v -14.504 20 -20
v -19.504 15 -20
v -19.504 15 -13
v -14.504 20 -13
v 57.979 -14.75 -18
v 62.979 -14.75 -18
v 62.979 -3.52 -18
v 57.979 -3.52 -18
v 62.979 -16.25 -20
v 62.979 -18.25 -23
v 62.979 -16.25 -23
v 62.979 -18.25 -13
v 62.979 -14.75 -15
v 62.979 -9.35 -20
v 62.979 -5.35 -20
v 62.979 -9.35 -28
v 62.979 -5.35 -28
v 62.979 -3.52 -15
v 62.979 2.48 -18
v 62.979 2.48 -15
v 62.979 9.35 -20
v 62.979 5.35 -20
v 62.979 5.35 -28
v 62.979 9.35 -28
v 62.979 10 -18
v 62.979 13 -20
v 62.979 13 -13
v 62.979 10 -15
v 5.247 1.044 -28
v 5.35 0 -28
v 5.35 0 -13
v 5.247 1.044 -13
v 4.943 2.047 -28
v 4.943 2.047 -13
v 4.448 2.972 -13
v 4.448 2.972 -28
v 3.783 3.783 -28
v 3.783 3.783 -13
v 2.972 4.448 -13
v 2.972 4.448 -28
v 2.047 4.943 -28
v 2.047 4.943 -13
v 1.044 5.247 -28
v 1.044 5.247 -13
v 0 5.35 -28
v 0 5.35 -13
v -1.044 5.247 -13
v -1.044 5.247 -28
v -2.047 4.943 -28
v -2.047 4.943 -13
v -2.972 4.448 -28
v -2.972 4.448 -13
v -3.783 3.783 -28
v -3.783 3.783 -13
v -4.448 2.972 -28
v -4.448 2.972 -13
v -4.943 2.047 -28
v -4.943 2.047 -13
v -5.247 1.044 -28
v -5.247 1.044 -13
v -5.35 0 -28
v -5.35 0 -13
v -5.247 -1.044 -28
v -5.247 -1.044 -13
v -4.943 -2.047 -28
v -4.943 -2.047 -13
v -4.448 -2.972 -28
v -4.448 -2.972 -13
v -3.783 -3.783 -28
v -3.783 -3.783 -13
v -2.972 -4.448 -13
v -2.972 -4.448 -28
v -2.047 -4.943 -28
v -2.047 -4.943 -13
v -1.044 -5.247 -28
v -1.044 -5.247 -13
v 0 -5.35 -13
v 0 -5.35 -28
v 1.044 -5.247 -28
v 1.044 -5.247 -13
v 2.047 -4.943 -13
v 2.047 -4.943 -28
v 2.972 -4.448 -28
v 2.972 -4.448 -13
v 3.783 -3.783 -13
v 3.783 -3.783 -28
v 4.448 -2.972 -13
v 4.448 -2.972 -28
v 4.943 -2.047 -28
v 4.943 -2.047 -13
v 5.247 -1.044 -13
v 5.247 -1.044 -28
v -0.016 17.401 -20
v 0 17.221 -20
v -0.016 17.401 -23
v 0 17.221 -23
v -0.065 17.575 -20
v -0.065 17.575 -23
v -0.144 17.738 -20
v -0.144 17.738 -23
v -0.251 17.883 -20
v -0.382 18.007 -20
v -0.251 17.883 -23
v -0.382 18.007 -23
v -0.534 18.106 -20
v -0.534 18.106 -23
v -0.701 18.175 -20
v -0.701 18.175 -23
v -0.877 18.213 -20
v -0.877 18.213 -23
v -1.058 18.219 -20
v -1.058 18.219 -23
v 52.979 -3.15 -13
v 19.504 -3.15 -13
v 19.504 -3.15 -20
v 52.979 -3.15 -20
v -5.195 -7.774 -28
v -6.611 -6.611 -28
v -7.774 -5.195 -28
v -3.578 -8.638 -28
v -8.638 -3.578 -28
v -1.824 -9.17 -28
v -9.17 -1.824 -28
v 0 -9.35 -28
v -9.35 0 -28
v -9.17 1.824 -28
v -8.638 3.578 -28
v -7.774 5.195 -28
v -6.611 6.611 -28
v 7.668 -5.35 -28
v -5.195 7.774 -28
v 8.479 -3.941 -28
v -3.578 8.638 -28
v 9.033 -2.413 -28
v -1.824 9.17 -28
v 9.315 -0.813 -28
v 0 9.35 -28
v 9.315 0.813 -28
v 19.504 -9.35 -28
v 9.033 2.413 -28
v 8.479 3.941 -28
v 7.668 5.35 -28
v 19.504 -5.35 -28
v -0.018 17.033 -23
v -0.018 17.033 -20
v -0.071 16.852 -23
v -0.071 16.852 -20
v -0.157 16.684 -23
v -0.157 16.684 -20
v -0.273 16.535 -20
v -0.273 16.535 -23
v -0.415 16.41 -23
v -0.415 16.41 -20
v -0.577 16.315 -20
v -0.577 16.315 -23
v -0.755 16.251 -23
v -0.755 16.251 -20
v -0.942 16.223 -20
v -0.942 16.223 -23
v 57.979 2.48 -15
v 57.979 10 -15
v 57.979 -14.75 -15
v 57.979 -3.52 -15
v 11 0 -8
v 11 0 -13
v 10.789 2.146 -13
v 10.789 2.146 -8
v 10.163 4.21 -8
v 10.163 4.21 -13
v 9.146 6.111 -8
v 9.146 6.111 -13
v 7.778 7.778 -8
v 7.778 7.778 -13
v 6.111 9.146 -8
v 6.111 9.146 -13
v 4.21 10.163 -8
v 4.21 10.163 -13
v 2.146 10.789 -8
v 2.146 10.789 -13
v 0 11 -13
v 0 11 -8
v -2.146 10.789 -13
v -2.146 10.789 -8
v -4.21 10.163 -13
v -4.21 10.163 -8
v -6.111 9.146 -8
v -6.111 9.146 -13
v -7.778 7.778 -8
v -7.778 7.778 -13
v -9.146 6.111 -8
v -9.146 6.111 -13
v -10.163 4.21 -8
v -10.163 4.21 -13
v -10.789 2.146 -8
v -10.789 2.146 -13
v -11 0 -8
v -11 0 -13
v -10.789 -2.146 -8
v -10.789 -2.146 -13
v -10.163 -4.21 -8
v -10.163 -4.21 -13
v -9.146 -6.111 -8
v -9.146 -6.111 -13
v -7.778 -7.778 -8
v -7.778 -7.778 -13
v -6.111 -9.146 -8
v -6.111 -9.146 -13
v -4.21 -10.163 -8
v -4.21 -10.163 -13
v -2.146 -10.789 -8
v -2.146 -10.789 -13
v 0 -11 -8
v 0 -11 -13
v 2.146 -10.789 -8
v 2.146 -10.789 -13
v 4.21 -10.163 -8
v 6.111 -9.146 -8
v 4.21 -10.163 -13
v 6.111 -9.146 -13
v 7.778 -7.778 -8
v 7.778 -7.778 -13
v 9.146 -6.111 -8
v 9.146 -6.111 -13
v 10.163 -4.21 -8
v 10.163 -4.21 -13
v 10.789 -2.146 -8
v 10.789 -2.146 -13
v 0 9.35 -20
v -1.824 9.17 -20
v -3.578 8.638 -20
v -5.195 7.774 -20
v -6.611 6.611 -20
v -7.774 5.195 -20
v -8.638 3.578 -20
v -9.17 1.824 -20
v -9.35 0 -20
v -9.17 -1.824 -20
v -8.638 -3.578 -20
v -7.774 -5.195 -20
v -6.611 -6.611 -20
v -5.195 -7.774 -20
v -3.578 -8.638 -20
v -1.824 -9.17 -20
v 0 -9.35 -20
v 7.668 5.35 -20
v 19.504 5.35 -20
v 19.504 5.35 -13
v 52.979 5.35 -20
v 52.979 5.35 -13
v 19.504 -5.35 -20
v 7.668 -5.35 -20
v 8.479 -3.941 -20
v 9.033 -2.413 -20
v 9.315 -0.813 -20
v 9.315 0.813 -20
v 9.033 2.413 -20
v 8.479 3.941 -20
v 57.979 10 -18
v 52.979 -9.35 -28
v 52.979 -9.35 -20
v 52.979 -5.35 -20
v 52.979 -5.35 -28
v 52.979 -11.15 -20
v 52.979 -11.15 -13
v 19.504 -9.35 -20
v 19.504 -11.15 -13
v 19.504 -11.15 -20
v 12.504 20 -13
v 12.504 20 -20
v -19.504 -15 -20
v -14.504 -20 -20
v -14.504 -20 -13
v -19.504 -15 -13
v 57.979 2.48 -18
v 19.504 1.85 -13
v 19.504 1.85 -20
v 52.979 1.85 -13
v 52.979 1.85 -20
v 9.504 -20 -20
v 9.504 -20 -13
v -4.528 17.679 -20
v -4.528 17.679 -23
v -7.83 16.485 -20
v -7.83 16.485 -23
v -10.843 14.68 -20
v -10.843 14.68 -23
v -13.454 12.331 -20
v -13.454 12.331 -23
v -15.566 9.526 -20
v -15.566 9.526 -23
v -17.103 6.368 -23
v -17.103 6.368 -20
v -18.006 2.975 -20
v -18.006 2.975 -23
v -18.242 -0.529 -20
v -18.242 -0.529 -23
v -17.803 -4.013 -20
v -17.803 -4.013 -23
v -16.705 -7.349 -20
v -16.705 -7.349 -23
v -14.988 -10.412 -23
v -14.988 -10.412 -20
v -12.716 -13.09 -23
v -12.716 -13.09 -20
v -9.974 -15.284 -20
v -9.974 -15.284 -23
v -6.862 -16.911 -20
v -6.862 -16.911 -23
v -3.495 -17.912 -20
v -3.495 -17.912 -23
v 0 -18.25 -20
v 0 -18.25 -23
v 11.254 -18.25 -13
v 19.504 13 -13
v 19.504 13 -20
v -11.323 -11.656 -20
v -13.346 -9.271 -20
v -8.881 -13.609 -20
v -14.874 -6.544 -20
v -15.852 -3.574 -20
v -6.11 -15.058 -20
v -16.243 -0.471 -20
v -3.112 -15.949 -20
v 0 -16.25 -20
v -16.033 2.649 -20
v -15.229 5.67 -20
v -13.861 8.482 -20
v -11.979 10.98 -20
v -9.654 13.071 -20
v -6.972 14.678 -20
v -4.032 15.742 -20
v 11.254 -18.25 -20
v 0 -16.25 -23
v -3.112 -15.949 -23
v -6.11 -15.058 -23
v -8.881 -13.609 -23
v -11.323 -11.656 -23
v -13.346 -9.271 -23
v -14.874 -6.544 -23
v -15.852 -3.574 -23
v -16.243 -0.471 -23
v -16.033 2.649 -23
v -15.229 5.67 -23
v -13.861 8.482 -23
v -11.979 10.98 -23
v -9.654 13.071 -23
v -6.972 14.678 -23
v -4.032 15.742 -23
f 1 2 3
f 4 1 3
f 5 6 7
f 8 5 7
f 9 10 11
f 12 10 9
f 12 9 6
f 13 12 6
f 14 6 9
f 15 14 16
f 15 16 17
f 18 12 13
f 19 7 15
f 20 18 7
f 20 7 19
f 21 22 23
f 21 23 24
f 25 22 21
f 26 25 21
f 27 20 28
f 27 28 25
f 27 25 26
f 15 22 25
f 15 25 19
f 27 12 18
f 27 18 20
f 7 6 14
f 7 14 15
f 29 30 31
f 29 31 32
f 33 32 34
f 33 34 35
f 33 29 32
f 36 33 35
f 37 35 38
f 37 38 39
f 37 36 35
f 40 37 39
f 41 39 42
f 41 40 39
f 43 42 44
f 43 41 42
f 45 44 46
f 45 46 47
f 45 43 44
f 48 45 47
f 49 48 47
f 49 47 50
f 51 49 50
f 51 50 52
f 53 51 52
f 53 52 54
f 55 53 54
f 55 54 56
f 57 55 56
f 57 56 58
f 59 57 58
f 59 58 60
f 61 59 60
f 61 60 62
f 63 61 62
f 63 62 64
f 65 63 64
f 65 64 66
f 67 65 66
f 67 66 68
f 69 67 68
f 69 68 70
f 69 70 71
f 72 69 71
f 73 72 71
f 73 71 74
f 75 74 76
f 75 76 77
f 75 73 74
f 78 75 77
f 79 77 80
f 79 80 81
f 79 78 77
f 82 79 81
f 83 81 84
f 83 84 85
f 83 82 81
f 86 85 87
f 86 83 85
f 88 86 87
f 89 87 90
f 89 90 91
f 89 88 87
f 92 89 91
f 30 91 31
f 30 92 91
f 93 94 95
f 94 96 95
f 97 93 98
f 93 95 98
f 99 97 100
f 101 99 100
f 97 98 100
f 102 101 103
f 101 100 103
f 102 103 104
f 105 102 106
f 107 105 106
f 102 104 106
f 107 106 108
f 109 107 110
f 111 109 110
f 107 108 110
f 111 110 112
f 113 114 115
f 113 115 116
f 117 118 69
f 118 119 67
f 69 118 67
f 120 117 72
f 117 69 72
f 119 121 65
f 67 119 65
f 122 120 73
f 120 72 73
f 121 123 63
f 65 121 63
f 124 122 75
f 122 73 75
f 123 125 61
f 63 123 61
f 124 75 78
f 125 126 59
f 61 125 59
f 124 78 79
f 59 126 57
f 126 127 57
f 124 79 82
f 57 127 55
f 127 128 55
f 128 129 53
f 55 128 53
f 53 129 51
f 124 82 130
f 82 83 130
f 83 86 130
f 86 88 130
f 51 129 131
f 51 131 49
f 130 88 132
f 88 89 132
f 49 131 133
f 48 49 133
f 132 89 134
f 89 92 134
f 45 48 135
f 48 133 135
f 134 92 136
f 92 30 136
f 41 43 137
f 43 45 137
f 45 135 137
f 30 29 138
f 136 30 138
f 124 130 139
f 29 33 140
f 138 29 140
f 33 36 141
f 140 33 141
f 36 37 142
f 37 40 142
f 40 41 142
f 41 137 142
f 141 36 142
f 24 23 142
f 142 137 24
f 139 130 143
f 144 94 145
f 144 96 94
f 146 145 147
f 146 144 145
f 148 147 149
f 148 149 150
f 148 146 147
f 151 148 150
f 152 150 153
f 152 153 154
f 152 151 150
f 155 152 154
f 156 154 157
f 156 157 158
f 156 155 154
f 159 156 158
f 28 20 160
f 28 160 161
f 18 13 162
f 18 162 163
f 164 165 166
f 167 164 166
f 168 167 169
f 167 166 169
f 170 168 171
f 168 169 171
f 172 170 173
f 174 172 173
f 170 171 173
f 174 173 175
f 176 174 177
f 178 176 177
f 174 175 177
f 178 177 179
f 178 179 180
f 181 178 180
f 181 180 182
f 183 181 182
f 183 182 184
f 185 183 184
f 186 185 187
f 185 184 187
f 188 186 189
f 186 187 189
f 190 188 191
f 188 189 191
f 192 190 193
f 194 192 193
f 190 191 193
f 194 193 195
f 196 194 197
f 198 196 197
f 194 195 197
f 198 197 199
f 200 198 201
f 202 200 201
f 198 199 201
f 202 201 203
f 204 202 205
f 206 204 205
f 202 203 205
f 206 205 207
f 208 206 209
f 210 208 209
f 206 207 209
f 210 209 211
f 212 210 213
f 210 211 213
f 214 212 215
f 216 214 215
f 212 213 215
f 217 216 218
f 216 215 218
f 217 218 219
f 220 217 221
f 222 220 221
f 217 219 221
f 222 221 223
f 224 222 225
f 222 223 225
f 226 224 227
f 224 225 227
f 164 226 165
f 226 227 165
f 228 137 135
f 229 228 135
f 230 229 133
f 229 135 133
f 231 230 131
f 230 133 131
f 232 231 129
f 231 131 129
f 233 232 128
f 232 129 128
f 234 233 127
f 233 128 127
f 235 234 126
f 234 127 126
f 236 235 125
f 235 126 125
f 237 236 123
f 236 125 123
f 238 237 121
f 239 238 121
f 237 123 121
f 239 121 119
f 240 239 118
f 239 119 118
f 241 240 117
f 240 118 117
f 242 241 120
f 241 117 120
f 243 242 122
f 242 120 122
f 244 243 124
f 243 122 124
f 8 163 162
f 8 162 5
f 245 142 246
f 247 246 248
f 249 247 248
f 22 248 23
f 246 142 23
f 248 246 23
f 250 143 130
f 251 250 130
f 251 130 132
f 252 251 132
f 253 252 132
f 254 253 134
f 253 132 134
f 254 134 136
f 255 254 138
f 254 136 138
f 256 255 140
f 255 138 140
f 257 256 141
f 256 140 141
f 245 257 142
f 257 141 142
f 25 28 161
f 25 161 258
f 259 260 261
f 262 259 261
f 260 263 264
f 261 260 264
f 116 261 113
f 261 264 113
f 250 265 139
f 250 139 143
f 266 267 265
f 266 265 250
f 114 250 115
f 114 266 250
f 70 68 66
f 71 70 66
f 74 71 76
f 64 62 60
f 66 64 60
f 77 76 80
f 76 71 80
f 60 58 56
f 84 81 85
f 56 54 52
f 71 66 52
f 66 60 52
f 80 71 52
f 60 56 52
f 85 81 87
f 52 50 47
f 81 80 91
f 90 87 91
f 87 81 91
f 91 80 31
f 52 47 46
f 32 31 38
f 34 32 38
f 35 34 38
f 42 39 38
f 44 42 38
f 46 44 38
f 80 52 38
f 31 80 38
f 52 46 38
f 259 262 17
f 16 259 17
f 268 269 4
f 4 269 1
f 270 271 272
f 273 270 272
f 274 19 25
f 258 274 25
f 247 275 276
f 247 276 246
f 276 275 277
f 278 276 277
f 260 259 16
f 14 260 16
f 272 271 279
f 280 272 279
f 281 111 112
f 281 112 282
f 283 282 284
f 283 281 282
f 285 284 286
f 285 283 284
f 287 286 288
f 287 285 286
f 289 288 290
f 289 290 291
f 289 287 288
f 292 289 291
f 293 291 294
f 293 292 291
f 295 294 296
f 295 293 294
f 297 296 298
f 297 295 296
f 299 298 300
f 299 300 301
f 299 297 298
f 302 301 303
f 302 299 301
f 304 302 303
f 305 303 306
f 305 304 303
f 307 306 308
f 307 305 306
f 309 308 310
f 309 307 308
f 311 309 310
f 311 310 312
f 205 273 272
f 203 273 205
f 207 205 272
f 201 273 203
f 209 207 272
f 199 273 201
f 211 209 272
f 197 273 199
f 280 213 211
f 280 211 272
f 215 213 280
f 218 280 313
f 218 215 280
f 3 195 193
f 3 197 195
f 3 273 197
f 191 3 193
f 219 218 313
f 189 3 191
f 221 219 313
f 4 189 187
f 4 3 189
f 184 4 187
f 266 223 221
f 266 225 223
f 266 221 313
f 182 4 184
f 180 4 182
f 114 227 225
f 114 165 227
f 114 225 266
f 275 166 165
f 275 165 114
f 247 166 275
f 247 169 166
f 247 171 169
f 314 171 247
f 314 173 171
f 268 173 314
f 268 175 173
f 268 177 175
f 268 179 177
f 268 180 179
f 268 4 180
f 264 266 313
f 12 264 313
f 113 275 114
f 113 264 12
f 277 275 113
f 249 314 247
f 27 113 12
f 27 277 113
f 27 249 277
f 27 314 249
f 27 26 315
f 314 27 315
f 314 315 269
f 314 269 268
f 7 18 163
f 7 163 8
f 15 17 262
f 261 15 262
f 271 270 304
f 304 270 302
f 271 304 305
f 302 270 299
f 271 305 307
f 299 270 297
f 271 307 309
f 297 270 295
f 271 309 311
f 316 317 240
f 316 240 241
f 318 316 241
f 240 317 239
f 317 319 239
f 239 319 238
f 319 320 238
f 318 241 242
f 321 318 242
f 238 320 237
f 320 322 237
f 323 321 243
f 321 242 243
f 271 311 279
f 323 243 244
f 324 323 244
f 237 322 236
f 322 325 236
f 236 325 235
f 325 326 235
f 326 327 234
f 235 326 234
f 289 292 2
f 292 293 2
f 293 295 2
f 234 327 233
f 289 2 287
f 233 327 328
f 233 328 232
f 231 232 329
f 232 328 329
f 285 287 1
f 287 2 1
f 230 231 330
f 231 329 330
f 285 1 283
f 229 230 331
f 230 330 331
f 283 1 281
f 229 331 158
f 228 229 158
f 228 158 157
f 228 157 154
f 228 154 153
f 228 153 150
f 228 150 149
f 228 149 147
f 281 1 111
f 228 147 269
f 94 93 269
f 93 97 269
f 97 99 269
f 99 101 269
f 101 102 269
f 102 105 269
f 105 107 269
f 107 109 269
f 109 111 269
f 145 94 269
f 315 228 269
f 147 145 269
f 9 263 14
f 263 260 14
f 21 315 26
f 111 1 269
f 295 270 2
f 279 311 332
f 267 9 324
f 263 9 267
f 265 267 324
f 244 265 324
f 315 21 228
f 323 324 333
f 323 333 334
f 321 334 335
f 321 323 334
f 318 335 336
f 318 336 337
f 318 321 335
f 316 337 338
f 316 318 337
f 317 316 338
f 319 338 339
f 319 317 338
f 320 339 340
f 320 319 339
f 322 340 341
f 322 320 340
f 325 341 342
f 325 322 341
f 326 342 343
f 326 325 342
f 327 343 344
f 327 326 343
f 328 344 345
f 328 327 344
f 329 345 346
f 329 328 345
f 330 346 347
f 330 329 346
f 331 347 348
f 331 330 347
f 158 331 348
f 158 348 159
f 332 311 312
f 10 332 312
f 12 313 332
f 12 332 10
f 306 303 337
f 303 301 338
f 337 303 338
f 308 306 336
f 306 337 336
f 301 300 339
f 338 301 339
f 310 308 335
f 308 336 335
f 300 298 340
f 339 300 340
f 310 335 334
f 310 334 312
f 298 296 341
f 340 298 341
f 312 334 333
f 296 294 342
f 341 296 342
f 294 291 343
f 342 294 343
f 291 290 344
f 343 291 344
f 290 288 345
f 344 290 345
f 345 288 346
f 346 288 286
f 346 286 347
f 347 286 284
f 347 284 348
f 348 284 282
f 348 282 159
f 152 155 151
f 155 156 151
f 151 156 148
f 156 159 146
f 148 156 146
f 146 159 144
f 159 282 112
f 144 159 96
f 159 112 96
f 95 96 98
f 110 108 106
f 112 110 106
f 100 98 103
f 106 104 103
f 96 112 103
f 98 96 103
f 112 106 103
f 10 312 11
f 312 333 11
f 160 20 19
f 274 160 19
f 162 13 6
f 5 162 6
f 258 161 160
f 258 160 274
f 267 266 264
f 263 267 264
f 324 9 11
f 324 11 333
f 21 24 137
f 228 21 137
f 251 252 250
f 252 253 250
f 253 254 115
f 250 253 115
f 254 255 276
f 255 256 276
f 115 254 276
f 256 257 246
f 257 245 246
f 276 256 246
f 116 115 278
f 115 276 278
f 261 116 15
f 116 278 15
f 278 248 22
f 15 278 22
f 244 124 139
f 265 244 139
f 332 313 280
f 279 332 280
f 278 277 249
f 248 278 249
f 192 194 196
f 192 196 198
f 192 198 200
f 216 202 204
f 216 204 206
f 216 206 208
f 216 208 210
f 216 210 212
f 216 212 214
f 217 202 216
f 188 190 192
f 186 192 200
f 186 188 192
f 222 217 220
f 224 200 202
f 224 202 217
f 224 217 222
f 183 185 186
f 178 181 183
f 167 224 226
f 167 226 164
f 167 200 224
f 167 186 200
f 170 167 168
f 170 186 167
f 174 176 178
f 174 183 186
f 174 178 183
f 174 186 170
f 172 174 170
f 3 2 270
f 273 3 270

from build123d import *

# Parameters (mm, degrees)
SKETCH1_R               = 5.35
BOSS_EXTRUDE2_DEPTH     = 7
BOSS_EXTRUDE3_START     = 8
SKETCH3_R               = 5.35
BOSS_EXTRUDE3_DEPTH     = 8
BOSS_EXTRUDE4_DEPTH     = 3
FILLET1_R               = 1
CHAMFER1_SIZE           = 10
CHAMFER2_SIZE           = 5
CUT_EXTRUDE1_DEPTH      = 67.560662475
CUT_EXTRUDE1_DEPTH_BACK = 67.560662475
SKETCH5_W               = 33.474956737
SKETCH5_H               = 3.5
SKETCH5_H_2             = 8
CHAMFER3_SIZE           = 7
SKETCH6_R               = 11
BOSS_EXTRUDE5_DEPTH     = 5
SKETCH8_W               = 3
SKETCH8_H               = 7.519820499
SKETCH8_H_2             = 11.230179501
CUT_EXTRUDE2_DEPTH      = 5


# Some blends are built 0.0001 mm under size
with BuildPart() as part:
    # Sketch1 → Boss-Extrude2 (new body)
    with BuildSketch(Plane.XY):
        Polygon((-19.503784034, -20), (19.503784034, -20), (19.503784034, -18.25), (62.978740771, -18.25), (62.978740771, 13), (19.503784034, 13), (19.503784034, 20), (-19.503784034, 20), align=None)
        Circle(SKETCH1_R, mode=Mode.SUBTRACT)
    extrude(amount=-BOSS_EXTRUDE2_DEPTH)

    # Sketch3 → Boss-Extrude3 (add)
    with BuildSketch(Plane.XY.offset(BOSS_EXTRUDE3_START)):
        with BuildLine():
            Line((7.668115805, 5.35), (62.978740771, 5.35))
            Line((62.978740771, 5.35), (62.978740771, 9.35))
            Line((62.978740771, 9.35), (0, 9.35))
            ThreePointArc((0, 9.35), (-9.35, 0), (0, -9.35))
            Line((0, -9.35), (62.978740771, -9.35))
            Line((62.978740771, -9.35), (62.978740771, -5.35))
            Line((62.978740771, -5.35), (7.668115805, -5.35))
            ThreePointArc((7.668115805, -5.35), (9.35, 0), (7.668115805, 5.35))
        make_face()
        Circle(SKETCH3_R, mode=Mode.SUBTRACT)
    extrude(amount=-BOSS_EXTRUDE3_DEPTH)

    # Sketch4 → Boss-Extrude4 (add)
    with BuildSketch(Plane.XY):
        with BuildLine():
            Line((0, -18.25), (62.978740771, -18.25))
            Line((62.978740771, -18.25), (62.978740771, -16.25))
            Line((62.978740771, -16.25), (8.306623863, -16.25))
            Line((8.306623863, -16.25), (0, -16.25))
            ThreePointArc((0, -16.25), (-16.25, 0), (0, 16.25))
            Line((0, 16.25), (0, 18.25))
            ThreePointArc((0, 18.25), (-18.25, 0), (0, -18.25))
        make_face()
    extrude(amount=BOSS_EXTRUDE4_DEPTH)

    # Fillet1
    fillet1_edges = [part.edges().sort_by_distance(p)[0] for p in [
        (0, 16.25, 1.5),
        (0, 18.25, 1.5),
    ]]
    fillet(fillet1_edges, radius=FILLET1_R - 0.0001)  # a hair under: the kernel refuses the full size

    # Chamfer1
    # the kernel refuses this chamfer: 10 mm, written as the material it takes off along each edge
    with BuildSketch(Plane(origin=(19.503784034, -20, 25.71682988), x_dir=(0.027495876610586317, 0.9996219169112968, 0), z_dir=(0, 0, -1))) as chamfer1_piece_1_section:
        Polygon((CHAMFER1_SIZE * 0.999621916911, -CHAMFER1_SIZE * 0.0274958766106), (-CHAMFER1_SIZE * 0.0274958766106, -CHAMFER1_SIZE * 0.999621916911), (0, 0), align=None)
    chamfer1_piece_1 = extrude(amount=58.433659759, mode=Mode.PRIVATE)
    chamfer1_piece_1 = split(chamfer1_piece_1, bisect_by=Plane(origin=(14.814200223, -18.25, -3.5), z_dir=(0, -1, 0)), keep=Keep.TOP, mode=Mode.PRIVATE)
    add(chamfer1_piece_1, mode=Mode.SUBTRACT)

    # Chamfer2
    chamfer2_edges = [part.edges().sort_by_distance(p)[0] for p in [
        (-19.503784034, -20, -3.5),
        (-19.503784034, 20, -3.5),
    ]]
    chamfer(chamfer2_edges, length=CHAMFER2_SIZE)

    # Sketch5 → Cut-Extrude1 (cut, two sides: drawn at the far end of the back side and taken through both)
    with BuildSketch(Plane.XY.offset(-CUT_EXTRUDE1_DEPTH_BACK)):
        with Locations((36.241262403, 3.6)):
            Rectangle(SKETCH5_W, SKETCH5_H)
        with Locations((36.241262403, -7.15)):
            Rectangle(SKETCH5_W, SKETCH5_H_2)
    extrude(amount=CUT_EXTRUDE1_DEPTH + CUT_EXTRUDE1_DEPTH_BACK, mode=Mode.SUBTRACT)

    # Chamfer3
    chamfer3_edges = [part.edges().sort_by_distance(p)[0] for p in [
        (19.503784034, 20, -3.5),
    ]]
    chamfer(chamfer3_edges, length=CHAMFER3_SIZE - 0.0001)  # a hair under: the kernel refuses the full size


with BuildPart() as body_2:
    # Mirror9: mirrored copy
    add(part.part.mirror(Plane.XY.offset(-10)))

    # Sketch6 → Boss-Extrude5 (add)
    with BuildSketch(Plane.XY.offset(-13)):
        Circle(SKETCH6_R)
    extrude(amount=BOSS_EXTRUDE5_DEPTH)

    # Sketch8 → Cut-Extrude2 (cut)
    with BuildSketch(Plane(origin=(62.978740771, 0, 0), x_dir=(0, 0, -1), z_dir=(1, 0, 0))):
        with Locations((16.5, 6.240089751)):
            Rectangle(SKETCH8_W, SKETCH8_H)
        with Locations((16.5, -9.13491025)):
            Rectangle(SKETCH8_W, SKETCH8_H_2)
    extrude(amount=-CUT_EXTRUDE2_DEPTH, mode=Mode.SUBTRACT)


solid = body_2.part
